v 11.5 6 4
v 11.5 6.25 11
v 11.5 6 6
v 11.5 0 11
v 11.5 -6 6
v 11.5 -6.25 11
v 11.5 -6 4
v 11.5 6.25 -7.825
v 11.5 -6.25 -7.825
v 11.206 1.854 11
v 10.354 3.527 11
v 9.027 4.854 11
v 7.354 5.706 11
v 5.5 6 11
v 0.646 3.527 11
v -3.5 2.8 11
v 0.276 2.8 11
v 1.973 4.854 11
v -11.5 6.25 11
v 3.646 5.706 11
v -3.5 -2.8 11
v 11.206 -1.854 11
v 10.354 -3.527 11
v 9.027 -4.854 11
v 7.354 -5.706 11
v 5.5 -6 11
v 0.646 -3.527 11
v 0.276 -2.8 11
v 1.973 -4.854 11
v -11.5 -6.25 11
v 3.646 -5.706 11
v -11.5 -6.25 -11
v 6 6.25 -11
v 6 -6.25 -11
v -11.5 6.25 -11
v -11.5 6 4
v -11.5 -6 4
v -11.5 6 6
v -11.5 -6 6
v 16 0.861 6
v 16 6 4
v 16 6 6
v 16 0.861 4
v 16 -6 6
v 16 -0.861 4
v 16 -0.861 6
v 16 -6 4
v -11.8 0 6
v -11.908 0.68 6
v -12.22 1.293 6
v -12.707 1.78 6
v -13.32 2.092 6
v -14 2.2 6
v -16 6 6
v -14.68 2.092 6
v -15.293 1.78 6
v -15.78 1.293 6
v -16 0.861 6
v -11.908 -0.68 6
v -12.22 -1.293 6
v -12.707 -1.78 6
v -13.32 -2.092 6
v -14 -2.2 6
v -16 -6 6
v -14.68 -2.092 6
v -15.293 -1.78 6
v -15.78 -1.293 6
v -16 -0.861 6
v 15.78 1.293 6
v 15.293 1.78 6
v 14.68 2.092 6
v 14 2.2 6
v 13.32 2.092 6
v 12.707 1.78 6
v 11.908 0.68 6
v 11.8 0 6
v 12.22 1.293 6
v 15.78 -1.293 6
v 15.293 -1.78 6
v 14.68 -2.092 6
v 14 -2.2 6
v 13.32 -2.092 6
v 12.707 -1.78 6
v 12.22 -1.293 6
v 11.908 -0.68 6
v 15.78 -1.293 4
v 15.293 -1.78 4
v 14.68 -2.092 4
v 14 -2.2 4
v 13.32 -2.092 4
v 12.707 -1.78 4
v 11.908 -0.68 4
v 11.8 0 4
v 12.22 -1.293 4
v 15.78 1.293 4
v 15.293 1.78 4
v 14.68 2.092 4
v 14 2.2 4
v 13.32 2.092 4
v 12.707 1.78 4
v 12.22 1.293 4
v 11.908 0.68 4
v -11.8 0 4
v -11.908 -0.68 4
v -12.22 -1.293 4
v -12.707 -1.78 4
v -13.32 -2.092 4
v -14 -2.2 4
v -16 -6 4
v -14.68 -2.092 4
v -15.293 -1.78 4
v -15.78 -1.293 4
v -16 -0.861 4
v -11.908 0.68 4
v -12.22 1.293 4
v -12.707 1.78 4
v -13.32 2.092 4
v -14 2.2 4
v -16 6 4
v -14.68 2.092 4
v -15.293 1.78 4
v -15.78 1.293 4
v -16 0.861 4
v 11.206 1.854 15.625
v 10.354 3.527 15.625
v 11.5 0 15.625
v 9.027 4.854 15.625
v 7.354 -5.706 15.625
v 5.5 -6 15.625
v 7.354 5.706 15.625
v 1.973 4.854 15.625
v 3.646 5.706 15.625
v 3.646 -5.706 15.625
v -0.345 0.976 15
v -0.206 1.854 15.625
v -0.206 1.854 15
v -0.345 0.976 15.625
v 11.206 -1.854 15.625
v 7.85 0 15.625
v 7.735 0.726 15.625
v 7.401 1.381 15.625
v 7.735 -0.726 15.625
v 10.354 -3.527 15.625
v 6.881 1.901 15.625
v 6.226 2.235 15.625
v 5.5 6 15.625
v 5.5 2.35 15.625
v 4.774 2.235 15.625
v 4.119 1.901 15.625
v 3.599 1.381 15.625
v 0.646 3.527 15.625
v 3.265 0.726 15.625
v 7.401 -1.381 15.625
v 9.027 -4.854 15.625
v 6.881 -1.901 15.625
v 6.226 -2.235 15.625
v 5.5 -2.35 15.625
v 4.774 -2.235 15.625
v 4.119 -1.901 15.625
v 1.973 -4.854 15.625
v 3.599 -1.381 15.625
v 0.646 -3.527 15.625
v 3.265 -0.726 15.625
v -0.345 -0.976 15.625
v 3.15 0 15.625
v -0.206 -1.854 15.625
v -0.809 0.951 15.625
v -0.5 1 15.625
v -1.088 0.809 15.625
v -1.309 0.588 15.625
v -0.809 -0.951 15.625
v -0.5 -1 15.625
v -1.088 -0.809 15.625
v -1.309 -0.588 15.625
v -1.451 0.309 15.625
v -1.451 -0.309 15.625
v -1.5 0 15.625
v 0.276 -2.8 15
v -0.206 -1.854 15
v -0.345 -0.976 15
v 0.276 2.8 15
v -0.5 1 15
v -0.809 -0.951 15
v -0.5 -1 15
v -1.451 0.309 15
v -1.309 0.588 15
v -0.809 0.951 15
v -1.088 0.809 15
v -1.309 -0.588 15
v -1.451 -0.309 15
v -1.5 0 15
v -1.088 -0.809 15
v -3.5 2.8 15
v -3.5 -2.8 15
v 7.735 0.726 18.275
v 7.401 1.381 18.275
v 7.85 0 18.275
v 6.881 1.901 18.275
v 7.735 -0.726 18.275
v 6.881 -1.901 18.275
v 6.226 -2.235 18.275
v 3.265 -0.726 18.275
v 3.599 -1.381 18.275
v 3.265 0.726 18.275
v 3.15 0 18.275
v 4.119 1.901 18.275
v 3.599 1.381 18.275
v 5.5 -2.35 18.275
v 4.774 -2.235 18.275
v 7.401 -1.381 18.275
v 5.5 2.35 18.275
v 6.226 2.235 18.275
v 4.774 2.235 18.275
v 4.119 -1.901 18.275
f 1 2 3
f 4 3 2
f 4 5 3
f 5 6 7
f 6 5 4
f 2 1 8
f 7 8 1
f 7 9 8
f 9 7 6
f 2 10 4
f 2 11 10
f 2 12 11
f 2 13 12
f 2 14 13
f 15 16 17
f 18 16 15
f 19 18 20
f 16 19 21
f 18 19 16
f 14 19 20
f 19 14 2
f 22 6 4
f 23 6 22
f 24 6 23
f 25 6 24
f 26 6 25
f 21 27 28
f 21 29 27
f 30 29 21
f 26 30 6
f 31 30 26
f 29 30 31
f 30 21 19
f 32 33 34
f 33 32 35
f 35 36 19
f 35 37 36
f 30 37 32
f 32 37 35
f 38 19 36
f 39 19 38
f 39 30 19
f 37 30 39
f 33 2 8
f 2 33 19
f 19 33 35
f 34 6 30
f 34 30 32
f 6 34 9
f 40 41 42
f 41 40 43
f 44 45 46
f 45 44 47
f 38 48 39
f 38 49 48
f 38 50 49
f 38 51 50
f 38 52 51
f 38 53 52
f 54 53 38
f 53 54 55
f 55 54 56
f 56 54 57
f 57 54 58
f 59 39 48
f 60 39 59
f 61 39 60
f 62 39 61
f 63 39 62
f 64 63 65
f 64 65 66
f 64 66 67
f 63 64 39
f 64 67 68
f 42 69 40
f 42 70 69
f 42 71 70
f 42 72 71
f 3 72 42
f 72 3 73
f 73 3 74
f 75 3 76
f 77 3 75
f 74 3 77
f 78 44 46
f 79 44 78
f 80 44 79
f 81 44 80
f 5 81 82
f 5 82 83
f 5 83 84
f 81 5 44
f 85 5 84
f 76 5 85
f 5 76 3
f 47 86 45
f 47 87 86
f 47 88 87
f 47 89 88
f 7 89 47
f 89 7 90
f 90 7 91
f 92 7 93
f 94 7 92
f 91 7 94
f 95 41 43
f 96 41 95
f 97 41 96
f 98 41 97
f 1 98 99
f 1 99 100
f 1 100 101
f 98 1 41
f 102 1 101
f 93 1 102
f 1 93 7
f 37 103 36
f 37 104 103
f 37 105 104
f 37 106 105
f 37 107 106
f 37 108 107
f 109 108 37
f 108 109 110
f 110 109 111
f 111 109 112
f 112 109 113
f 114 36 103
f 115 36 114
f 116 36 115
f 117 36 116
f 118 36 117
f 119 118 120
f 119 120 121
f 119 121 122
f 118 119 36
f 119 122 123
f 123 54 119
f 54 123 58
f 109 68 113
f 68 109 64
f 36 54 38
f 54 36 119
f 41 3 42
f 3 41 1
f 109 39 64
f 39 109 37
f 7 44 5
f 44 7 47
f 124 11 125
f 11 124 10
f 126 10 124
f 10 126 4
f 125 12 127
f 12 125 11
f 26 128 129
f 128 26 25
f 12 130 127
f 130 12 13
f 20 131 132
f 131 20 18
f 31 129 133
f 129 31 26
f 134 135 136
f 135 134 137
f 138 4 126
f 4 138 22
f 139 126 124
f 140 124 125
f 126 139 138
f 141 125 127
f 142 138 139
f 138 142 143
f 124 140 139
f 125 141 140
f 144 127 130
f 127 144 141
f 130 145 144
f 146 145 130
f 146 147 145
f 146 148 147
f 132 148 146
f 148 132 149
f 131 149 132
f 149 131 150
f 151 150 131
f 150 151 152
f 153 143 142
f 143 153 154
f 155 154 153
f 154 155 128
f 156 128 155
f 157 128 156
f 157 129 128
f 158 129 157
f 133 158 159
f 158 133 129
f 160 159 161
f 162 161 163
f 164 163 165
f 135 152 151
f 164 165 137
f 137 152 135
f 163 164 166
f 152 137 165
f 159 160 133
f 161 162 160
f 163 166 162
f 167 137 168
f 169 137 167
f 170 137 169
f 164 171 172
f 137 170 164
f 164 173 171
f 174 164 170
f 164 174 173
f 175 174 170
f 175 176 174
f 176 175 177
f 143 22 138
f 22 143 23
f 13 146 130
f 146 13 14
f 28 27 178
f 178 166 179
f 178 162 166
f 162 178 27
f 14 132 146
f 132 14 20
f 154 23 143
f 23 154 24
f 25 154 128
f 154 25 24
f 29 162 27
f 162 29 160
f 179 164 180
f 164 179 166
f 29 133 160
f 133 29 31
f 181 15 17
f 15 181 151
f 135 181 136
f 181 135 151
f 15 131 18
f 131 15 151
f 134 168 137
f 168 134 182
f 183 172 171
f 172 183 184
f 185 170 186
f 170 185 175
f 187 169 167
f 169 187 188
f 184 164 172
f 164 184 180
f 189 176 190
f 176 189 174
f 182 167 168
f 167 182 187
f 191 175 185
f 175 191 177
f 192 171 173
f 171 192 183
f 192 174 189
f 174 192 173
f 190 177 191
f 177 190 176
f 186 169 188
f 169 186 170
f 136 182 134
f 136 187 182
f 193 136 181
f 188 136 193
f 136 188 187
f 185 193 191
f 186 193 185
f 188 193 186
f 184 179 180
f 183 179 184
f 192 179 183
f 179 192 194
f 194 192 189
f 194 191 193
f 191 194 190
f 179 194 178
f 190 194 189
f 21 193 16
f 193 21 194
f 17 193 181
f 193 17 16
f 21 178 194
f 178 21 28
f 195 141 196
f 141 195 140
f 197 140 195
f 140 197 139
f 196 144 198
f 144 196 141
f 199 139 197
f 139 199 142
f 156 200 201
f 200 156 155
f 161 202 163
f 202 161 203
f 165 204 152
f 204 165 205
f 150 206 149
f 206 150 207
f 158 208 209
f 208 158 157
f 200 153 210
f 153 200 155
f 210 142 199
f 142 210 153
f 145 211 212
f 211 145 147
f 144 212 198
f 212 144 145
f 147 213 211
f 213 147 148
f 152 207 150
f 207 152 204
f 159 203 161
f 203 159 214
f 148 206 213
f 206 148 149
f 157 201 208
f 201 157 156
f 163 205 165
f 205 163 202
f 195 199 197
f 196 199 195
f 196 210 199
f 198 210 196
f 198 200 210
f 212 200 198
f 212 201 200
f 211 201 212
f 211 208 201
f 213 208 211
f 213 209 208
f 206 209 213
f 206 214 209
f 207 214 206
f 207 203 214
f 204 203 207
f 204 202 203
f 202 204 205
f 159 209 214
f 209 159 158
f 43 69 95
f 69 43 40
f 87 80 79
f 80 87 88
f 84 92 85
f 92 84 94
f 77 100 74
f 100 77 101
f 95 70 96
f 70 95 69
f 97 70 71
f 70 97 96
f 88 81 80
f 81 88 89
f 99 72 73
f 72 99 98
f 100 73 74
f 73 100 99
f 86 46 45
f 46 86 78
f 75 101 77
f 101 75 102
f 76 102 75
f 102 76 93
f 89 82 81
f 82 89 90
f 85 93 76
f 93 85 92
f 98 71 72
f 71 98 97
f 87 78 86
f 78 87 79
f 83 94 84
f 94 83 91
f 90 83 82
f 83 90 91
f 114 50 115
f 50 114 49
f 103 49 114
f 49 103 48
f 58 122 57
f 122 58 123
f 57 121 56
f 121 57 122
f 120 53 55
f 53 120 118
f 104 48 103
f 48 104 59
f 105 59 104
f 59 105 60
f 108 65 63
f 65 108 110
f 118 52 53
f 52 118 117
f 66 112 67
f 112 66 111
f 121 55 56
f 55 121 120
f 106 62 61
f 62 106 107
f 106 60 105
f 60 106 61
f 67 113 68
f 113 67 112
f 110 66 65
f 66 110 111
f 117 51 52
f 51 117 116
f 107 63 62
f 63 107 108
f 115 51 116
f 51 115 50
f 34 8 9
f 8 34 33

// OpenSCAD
9g_motor();

module 9g_motor(){
	difference(){			
		union(){
			color("blue") cube([23,12.5,22], center=true);
			color("blue") translate([0,0,5]) cube([32,12,2], center=true);
			color("blue") translate([5.5,0,2.75]) cylinder(r=6, h=25.75, $fn=20, center=true);
			color("blue") translate([-.5,0,2.75]) cylinder(r=1, h=25.75, $fn=20, center=true);
			color("blue") translate([-1,0,2.75]) cube([5,5.6,24.5], center=true);		
			color("white") translate([5.5,0,3.65]) cylinder(r=2.35, h=29.25, $fn=20, center=true);				
		}
		translate([10,0,-11]) rotate([0,-30,0]) cube([8,13,4], center=true);
		for ( hole = [14,-14] ){
			translate([hole,0,5]) cylinder(r=2.2, h=4, $fn=20, center=true);
		}	
	}
}

module 24g_motor(){
	difference(){			
		union(){
			color("black") cube([30,16,30], center=true);
			color("black") translate([0,0,5]) cube([42,16,2], center=true);
			color("black") translate([5.5,0,2.75]) cylinder(r=6, h=25.75, $fn=20, center=true);
			color("black") translate([-.5,0,2.75]) cylinder(r=1, h=25.75, $fn=20, center=true);
			color("black") translate([-1,0,2.75]) cube([5,5.6,24.5], center=true);		
			color("gold") translate([5.5,0,3.65]) cylinder(r=2.35, h=29.25, $fn=20, center=true);				
		}
		translate([10,0,-11]) rotate([0,-30,0]) cube([8,13,4], center=true);
		for ( hole = [20,-20] ){
			translate([hole,4,5]) cylinder(r=2.2, h=4, $fn=20, center=true);
            translate([hole,-4,5]) cylinder(r=2.2, h=4, $fn=20, center=true);
		}	
	}
}
